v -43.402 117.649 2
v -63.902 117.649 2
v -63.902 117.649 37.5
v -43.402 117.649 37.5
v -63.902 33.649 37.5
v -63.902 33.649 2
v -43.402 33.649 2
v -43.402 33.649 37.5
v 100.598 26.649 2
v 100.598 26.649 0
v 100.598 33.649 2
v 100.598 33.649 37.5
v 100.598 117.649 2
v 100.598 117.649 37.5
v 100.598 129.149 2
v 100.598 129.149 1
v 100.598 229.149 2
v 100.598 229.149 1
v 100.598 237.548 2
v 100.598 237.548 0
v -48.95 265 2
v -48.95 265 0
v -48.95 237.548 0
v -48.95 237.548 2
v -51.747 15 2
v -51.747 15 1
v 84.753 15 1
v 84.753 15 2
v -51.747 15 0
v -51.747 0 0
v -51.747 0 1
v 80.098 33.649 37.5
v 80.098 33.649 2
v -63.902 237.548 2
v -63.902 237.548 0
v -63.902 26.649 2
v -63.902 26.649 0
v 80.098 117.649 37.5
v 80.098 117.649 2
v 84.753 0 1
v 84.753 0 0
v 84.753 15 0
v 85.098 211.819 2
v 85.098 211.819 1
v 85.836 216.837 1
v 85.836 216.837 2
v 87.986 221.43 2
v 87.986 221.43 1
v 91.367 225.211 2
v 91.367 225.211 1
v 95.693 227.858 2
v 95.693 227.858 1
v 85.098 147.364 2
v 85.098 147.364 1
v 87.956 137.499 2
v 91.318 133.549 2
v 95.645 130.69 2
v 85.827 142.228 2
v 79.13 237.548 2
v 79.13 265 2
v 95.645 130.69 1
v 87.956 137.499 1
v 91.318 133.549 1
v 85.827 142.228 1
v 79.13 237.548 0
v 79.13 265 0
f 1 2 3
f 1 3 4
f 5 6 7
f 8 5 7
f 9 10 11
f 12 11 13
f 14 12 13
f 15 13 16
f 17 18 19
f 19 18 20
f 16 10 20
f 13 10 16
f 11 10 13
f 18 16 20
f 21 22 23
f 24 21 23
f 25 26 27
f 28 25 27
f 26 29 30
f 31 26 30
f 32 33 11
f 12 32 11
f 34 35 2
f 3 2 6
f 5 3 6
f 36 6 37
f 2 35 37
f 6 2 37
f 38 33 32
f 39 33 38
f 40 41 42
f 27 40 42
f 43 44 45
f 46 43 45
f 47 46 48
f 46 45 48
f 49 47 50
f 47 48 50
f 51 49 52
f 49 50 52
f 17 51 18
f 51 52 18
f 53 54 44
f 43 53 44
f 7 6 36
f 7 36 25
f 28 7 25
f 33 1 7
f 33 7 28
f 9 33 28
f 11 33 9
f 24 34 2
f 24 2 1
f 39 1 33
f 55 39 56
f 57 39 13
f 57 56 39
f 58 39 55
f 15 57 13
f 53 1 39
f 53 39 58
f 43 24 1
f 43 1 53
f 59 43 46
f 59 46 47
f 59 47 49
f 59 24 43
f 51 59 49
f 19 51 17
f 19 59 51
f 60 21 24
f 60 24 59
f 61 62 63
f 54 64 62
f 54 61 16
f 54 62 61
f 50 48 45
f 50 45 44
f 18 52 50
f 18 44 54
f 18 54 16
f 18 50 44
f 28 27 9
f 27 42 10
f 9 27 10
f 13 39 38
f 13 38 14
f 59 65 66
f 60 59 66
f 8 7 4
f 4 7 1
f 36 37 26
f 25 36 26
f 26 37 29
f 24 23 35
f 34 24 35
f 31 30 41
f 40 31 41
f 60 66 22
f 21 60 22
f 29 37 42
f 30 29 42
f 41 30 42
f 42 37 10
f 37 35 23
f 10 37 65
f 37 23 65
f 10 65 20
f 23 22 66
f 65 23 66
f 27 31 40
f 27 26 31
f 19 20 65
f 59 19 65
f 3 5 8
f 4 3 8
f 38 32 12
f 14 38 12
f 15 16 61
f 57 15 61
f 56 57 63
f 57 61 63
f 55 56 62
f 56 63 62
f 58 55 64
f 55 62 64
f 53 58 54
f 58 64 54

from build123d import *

# Parameters (mm, degrees)
F1_DEPTH = 2
F2_DEPTH = 1
F0_W     = 20.5
F0_H     = 84
F3_DEPTH = 37.5


with BuildPart() as f1:
    # F0 (on Top) → F1 (new body)
    with BuildSketch(Plane.XY):
        with BuildLine():
            Line((-51.746925, 15), (84.753075, 15))
            Line((84.753075, 15), (100.597961, 26.64865))
            Line((100.597961, 26.64865), (100.597961, 33.64865))
            Line((100.597961, 33.64865), (80.097961, 33.64865))
            Line((80.097961, 33.64865), (80.097961, 117.64865))
            Line((80.097961, 117.64865), (100.597961, 117.64865))
            Line((100.597961, 117.64865), (100.597961, 129.14865))
            ThreePointArc((100.597961, 129.14865), (89.497411, 135.405037), (85.097961, 147.363693))
            Line((85.097961, 147.363693), (85.097961, 211.818904))
            ThreePointArc((85.097961, 211.818904), (89.538305, 223.443985), (100.597961, 229.14865))
            Line((100.597961, 229.14865), (100.597961, 237.548321))
            Line((100.597961, 237.548321), (79.1298, 237.548321))
            Line((79.1298, 237.548321), (79.1298, 265))
            Line((79.1298, 265), (-48.949795, 265))
            Line((-48.949795, 265), (-48.949795, 237.548321))
            Line((-48.949795, 237.548321), (-63.902039, 237.548321))
            Line((-63.902039, 237.548321), (-63.902039, 180.590159))
            Line((-63.902039, 180.590159), (-63.902039, 117.64865))
            Line((-63.902039, 117.64865), (-43.402039, 117.64865))
            Line((-43.402039, 117.64865), (-43.402039, 33.64865))
            Line((-43.402039, 33.64865), (-63.902039, 33.64865))
            Line((-63.902039, 33.64865), (-63.902039, 26.64865))
            Line((-63.902039, 26.64865), (-51.746925, 15))
        make_face()
    extrude(amount=F1_DEPTH)

    # F0 (on Top) → F2 (join)
    with BuildSketch(Plane.XY):
        with BuildLine():
            ThreePointArc((85.097961, 147.363693), (89.497411, 135.405037), (100.597961, 129.14865))
            Line((100.597961, 129.14865), (100.597961, 229.14865))
            ThreePointArc((100.597961, 229.14865), (89.538305, 223.443985), (85.097961, 211.818904))
            Line((85.097961, 211.818904), (85.097961, 147.363693))
        make_face()
        Polygon((-51.746925, 0), (0, 0), (84.753075, 0), (84.753075, 15), (-51.746925, 15), align=None)
    extrude(amount=F2_DEPTH)

    # F0 (on Top) → F3 (join)
    with BuildSketch(Plane.XY):
        with Locations((90.347961, 75.64865)):
            Rectangle(F0_W, F0_H)
        with Locations((-53.652039, 75.64865)):
            Rectangle(F0_W, F0_H)
    extrude(amount=F3_DEPTH)


solid = f1.part
